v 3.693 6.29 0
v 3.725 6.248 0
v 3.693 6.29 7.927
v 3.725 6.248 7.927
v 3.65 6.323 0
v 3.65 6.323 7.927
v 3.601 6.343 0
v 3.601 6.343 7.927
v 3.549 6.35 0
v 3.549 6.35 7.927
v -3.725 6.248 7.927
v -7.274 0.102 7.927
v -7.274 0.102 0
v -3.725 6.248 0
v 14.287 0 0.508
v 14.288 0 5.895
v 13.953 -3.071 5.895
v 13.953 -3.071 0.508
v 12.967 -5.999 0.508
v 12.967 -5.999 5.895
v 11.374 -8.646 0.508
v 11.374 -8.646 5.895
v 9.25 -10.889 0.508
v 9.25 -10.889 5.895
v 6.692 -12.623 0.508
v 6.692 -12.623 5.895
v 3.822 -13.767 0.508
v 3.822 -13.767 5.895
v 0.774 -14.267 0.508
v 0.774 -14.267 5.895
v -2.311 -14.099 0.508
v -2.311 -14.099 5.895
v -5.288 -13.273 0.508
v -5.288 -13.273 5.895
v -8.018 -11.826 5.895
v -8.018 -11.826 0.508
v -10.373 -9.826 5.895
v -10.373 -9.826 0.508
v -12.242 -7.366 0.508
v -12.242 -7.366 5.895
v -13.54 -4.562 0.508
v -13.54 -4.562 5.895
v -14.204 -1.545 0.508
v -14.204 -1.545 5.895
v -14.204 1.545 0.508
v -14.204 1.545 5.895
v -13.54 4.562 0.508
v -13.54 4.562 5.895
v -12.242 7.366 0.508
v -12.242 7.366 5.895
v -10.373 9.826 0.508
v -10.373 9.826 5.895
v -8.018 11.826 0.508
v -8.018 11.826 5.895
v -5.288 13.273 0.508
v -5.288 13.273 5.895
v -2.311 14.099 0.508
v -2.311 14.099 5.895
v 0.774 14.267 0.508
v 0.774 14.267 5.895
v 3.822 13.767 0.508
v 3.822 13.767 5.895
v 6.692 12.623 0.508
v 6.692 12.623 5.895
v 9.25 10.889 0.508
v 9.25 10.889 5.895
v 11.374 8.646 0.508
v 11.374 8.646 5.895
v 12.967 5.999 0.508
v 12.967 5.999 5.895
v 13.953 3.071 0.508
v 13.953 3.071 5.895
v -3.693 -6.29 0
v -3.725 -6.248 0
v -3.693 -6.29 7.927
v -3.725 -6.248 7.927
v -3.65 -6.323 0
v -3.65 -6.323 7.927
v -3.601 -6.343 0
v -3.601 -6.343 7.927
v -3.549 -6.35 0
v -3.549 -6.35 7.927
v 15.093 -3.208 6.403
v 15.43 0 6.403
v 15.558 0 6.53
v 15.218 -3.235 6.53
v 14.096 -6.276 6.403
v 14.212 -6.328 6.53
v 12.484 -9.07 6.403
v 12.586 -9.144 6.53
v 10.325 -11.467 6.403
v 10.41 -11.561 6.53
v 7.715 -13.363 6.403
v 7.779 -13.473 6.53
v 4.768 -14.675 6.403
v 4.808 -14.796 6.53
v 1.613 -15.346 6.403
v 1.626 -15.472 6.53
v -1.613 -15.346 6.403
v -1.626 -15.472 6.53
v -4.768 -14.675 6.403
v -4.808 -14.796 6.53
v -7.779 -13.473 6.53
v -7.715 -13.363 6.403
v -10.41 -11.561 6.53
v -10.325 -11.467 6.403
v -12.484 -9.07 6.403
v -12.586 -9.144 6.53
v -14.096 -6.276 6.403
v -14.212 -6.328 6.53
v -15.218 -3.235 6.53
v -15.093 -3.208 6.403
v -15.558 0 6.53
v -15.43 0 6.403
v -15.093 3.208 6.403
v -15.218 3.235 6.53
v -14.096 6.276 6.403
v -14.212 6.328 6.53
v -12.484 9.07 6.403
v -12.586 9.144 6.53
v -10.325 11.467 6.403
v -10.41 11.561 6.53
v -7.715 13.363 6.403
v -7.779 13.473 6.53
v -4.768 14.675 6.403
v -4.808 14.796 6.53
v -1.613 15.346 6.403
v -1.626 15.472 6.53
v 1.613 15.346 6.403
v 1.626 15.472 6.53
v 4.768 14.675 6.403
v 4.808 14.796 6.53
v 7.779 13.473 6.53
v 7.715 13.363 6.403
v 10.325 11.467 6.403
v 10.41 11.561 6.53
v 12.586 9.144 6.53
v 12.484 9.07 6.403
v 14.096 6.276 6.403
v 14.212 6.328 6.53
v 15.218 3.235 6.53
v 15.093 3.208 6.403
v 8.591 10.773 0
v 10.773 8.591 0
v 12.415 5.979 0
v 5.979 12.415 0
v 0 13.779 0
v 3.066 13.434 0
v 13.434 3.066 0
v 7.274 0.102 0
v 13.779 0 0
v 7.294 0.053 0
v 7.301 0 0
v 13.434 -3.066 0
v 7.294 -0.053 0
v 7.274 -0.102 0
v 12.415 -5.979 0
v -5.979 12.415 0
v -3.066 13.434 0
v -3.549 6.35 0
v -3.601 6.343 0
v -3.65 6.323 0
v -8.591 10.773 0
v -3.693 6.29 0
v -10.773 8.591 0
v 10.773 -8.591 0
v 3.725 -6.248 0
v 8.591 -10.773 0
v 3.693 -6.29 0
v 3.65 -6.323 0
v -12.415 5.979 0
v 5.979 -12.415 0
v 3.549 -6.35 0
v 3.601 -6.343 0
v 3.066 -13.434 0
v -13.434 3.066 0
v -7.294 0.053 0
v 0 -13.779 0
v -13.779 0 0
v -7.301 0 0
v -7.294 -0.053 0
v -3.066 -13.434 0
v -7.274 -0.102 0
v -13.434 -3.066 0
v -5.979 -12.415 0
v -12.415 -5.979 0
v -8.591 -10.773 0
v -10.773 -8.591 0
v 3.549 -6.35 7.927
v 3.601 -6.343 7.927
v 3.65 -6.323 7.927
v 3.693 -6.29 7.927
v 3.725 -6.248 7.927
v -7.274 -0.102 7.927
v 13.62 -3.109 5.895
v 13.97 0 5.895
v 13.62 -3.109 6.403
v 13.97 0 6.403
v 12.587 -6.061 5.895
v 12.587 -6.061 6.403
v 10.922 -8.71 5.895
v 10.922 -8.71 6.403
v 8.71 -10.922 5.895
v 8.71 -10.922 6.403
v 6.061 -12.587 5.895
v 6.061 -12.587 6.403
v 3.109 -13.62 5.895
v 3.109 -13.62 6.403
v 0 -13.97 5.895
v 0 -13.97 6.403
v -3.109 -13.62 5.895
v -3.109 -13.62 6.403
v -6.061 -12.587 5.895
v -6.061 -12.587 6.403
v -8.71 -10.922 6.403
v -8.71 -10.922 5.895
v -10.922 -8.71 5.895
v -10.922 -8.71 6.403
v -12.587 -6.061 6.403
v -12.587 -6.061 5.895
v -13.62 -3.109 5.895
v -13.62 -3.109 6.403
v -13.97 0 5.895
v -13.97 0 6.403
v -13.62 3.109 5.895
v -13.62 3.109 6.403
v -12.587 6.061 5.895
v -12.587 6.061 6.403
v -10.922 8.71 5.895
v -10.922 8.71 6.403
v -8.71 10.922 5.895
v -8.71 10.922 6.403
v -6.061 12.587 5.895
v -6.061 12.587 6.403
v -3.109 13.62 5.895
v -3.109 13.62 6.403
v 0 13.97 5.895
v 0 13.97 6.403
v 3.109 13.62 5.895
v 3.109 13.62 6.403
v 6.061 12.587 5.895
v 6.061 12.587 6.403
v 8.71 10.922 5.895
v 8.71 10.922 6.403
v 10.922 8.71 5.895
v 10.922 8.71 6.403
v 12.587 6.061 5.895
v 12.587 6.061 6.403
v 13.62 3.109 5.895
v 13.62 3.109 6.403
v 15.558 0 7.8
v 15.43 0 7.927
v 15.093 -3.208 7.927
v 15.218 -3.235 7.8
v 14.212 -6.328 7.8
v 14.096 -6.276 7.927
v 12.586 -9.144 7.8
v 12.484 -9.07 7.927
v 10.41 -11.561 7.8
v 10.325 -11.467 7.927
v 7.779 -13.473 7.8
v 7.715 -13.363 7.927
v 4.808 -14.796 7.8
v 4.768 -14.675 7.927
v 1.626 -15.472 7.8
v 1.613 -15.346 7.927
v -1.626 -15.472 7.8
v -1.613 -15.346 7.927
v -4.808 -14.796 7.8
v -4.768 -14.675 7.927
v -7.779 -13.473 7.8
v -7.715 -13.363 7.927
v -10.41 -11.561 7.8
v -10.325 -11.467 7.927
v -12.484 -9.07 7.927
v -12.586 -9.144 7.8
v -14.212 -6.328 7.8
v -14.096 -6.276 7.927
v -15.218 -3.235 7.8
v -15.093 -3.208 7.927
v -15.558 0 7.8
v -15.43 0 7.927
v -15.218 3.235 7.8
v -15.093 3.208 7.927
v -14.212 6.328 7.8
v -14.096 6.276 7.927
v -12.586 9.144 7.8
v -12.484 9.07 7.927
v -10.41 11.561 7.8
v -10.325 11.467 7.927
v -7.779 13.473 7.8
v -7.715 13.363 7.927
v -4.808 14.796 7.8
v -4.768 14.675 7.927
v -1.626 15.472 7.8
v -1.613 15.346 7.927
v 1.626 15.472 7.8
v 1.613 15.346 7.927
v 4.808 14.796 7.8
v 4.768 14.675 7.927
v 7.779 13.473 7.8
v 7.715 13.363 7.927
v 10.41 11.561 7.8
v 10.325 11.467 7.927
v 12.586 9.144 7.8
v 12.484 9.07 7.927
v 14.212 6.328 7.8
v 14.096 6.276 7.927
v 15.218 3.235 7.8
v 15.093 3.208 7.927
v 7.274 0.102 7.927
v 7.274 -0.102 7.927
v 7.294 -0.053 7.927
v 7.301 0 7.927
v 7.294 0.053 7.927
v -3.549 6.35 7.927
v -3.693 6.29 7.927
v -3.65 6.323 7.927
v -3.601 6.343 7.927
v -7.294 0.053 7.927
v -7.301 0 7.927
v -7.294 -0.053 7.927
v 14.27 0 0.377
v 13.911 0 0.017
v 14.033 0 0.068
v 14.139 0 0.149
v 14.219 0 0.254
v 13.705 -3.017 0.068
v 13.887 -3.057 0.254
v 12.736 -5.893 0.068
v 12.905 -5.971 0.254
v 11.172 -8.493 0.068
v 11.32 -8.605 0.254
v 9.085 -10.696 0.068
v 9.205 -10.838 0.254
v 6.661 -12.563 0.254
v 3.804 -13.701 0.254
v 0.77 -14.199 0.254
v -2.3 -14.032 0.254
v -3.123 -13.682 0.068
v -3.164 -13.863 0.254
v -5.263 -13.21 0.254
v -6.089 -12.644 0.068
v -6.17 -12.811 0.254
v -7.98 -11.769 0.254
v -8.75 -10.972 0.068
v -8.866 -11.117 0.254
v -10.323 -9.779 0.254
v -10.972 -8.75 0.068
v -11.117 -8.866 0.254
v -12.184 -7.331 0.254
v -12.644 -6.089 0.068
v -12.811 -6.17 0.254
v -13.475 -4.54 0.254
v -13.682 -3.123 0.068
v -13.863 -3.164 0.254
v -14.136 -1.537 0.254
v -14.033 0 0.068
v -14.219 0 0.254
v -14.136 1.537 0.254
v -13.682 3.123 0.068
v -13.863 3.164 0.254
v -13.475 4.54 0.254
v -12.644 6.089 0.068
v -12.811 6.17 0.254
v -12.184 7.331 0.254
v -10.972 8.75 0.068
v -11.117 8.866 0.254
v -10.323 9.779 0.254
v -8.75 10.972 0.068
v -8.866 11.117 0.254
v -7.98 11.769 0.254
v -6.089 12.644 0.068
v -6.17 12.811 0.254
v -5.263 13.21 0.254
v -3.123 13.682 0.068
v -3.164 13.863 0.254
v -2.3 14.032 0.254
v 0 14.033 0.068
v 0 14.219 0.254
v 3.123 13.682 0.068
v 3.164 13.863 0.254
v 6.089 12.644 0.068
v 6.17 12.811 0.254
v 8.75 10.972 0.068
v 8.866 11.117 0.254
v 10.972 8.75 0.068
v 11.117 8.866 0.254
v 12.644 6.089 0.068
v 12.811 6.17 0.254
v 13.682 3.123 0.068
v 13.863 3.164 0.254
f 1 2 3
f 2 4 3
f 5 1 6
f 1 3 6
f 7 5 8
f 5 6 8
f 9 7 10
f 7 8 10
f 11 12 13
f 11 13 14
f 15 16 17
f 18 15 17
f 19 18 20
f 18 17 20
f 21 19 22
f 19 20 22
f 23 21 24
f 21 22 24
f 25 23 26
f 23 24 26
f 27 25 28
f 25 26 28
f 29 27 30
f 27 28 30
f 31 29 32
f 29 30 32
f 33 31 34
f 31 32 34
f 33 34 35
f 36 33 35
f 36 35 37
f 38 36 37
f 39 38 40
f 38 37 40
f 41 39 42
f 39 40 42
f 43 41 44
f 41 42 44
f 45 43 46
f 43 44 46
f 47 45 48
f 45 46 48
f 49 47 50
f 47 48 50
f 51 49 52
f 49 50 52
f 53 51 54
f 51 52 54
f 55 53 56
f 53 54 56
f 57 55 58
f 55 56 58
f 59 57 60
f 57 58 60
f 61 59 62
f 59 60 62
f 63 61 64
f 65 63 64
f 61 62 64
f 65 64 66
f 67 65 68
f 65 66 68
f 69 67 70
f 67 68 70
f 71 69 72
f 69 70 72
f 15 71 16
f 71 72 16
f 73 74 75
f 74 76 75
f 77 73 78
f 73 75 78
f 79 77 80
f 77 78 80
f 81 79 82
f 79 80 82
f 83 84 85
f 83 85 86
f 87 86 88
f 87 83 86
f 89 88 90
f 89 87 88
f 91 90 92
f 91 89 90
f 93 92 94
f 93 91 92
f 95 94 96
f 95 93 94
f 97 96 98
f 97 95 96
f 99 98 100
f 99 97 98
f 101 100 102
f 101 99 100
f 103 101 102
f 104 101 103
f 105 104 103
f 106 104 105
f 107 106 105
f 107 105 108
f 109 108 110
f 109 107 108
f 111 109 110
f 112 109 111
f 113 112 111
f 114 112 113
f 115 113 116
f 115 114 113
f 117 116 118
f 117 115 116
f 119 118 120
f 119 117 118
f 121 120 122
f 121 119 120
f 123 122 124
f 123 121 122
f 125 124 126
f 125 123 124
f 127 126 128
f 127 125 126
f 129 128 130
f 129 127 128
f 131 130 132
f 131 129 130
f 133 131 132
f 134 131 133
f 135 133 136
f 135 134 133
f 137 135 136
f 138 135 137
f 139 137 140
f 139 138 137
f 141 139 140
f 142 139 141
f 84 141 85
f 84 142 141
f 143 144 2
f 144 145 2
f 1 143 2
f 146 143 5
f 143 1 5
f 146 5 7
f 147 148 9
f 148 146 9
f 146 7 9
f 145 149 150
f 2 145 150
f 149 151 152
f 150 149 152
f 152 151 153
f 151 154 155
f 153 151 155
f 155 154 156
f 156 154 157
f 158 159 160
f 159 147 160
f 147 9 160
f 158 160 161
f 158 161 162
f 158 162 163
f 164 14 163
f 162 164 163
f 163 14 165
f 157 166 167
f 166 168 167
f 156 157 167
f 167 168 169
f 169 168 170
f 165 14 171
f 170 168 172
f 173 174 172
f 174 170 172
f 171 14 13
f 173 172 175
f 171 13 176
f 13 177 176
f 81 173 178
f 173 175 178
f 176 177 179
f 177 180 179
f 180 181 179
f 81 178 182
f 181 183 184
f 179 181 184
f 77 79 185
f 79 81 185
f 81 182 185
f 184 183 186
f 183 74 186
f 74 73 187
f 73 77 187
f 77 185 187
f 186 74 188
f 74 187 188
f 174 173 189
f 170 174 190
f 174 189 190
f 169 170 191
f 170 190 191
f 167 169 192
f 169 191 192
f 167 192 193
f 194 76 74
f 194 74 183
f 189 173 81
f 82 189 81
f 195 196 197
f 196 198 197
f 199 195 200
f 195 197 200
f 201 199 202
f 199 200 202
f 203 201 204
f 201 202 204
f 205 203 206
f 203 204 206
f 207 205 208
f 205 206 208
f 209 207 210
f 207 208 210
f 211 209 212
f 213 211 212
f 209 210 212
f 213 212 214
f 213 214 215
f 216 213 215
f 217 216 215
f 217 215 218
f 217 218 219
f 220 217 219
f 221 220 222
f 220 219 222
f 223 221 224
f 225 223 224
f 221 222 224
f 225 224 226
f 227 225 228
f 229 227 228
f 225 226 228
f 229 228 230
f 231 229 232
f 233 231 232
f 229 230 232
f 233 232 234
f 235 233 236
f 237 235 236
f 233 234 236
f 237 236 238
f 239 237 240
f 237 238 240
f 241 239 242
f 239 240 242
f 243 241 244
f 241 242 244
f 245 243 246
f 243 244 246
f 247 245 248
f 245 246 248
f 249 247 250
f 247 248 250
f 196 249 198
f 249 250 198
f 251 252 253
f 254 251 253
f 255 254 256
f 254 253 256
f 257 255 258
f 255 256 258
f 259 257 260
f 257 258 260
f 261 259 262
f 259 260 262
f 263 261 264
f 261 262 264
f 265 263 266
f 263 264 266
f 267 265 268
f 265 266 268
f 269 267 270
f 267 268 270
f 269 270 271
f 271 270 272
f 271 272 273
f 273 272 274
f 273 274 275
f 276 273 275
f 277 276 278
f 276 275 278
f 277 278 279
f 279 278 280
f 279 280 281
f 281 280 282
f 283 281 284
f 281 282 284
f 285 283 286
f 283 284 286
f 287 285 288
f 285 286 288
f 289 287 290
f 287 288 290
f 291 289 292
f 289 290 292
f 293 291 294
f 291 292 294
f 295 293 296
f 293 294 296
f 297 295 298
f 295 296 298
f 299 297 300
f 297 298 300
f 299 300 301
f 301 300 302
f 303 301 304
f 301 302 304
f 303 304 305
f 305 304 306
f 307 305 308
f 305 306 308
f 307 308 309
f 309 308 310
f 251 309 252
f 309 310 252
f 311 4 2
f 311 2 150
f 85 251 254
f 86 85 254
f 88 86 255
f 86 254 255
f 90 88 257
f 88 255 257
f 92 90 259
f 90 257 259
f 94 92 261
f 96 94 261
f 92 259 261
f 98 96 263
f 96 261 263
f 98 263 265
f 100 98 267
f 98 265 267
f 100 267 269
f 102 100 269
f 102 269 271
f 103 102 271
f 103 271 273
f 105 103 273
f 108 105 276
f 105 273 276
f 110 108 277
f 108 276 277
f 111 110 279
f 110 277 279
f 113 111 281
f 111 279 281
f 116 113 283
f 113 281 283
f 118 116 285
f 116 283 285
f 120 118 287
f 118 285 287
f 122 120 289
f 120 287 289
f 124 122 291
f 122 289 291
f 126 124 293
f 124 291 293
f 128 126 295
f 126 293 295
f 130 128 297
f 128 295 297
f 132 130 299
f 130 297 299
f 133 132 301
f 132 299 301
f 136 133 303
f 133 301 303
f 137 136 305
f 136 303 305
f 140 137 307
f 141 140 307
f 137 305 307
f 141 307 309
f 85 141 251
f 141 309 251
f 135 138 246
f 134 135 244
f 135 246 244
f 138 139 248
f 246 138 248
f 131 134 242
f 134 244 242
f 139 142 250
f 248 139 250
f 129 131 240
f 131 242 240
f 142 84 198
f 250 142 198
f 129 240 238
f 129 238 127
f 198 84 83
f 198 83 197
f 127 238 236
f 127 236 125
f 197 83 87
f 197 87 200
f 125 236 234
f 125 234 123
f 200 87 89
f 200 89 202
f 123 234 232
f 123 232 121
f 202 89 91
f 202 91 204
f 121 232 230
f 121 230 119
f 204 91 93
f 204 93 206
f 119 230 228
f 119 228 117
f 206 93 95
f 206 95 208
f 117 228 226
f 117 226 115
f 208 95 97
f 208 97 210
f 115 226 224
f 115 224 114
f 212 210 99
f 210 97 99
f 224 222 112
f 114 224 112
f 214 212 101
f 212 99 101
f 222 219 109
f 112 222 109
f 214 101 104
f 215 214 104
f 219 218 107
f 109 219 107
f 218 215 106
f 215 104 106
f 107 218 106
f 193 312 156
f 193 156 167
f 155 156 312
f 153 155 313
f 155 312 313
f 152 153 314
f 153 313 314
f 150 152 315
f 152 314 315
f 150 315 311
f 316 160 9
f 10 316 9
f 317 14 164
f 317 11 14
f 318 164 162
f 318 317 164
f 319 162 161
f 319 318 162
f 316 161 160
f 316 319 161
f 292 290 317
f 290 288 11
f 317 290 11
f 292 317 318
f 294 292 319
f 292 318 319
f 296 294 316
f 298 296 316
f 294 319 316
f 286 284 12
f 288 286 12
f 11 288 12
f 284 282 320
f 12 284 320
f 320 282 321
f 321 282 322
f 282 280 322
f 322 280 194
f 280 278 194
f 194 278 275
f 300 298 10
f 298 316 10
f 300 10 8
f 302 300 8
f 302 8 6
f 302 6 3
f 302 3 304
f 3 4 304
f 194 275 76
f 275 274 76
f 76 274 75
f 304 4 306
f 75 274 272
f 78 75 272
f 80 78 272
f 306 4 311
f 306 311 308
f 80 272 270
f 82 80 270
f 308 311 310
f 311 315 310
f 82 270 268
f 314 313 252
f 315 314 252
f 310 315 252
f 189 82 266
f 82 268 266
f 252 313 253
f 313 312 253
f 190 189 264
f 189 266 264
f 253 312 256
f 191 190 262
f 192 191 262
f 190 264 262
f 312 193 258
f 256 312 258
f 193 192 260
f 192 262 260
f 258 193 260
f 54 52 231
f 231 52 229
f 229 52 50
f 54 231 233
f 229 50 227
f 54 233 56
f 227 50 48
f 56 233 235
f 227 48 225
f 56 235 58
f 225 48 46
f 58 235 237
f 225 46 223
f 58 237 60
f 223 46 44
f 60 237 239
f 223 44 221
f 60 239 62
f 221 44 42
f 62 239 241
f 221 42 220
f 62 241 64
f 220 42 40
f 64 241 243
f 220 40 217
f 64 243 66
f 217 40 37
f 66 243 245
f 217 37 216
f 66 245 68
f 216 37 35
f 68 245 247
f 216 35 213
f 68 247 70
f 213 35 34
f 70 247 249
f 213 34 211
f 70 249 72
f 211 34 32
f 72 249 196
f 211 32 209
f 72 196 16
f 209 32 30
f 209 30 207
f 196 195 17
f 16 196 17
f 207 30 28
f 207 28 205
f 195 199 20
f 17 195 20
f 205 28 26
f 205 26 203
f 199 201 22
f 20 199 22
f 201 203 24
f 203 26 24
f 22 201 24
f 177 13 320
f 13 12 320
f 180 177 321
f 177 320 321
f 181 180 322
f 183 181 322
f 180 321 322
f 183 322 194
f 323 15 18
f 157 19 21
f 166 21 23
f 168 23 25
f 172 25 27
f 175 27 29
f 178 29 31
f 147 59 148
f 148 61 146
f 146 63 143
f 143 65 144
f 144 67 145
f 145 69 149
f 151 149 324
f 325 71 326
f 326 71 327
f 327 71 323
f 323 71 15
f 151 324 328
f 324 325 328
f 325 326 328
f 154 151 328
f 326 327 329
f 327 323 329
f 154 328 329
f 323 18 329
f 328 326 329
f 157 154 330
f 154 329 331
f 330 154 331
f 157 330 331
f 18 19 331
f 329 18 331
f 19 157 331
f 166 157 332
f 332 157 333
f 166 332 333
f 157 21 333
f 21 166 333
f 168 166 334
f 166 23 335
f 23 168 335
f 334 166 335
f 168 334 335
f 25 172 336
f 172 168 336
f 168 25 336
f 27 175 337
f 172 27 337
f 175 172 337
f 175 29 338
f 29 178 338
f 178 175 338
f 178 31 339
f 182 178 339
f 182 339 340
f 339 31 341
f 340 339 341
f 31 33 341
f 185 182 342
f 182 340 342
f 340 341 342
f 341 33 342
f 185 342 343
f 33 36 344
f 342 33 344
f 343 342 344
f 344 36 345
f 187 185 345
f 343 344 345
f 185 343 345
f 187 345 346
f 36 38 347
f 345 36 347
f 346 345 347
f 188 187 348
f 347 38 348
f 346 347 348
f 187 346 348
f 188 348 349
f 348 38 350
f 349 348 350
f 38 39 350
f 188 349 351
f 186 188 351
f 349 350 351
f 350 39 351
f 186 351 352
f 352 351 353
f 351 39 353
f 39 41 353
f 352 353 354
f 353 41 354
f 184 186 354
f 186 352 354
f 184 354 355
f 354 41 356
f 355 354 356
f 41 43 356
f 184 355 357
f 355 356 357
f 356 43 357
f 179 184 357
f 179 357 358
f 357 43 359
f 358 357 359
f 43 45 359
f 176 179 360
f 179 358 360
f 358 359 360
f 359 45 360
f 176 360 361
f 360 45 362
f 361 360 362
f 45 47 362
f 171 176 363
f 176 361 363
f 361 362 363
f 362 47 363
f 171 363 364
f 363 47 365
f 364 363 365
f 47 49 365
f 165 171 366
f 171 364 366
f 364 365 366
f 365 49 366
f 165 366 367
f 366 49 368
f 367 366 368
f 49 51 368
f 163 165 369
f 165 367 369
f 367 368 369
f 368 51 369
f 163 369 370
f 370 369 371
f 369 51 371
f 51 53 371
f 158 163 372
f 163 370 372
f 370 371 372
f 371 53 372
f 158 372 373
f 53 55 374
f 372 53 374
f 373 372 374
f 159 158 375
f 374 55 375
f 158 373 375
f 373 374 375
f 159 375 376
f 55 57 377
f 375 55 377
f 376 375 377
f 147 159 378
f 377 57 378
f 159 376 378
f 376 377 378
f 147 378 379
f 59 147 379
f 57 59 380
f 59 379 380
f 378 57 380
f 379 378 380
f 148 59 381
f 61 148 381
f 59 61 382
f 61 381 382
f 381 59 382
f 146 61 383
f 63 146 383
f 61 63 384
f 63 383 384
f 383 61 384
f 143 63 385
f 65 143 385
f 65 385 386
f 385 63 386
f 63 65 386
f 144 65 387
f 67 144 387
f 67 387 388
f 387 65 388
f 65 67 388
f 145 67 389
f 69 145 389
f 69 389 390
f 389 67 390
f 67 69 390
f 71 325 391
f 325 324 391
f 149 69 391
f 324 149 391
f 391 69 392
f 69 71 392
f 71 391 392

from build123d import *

# Parameters (mm, degrees)
CUT_EXTRUDE1_DEPTH = 8.92734
CHAMFER1_SIZE      = 0.127
CHAMFER2_SIZE      = 0.127
FILLET1_R          = 0.508
FILLET2_R          = 0.2032


with BuildPart() as part:
    # Sketch1 → Revolve1 (revolve)
    with BuildSketch(Plane.XZ):
        Polygon((15.5575, 7.92734), (0, 7.92734), (0, 0), (14.2875, 0), (14.2875, 5.89534), (13.97, 5.89534), (13.97, 6.40334), (15.5575, 6.40334), align=None)
    revolve(axis=Axis((0, 0, 7.92734), (0, 0, -1)))

    # Sketch2 → Cut-Extrude1 (cut, through all)
    with BuildSketch(Plane(origin=(0, 0, 0), x_dir=(-1, 0, 0), z_dir=(0, 0, -1))):
        Polygon((3.666174209, 6.35), (-3.666174209, 6.35), (-7.332348419, 0), (-3.666174209, -6.35), (3.666174209, -6.35), (7.332348419, 0), align=None)
    extrude(amount=-CUT_EXTRUDE1_DEPTH, mode=Mode.SUBTRACT)

    # Chamfer1
    chamfer1_edges = [part.edges().sort_by_distance(p)[0] for p in [
        (-15.5575, 0, 6.40334),
    ]]
    chamfer(chamfer1_edges, length=CHAMFER1_SIZE)

    # Chamfer2
    chamfer2_edges = [part.edges().sort_by_distance(p)[0] for p in [
        (-15.5575, 0, 7.92734),
    ]]
    chamfer(chamfer2_edges, length=CHAMFER2_SIZE)

    # Fillet1
    fillet1_edges = [part.edges().sort_by_distance(p)[0] for p in [
        (-14.2875, 0, 0),
    ]]
    fillet(fillet1_edges, radius=FILLET1_R)

    # Fillet2
    fillet2_edges = [part.edges().sort_by_distance(p)[0] for p in [
        (-3.666174209, 6.35, 3.96367),
        (-7.332348419, 0, 3.96367),
        (-3.666174209, -6.35, 3.96367),
        (3.666174209, -6.35, 3.96367),
        (7.332348419, 0, 3.96367),
        (3.666174209, 6.35, 3.96367),
    ]]
    fillet(fillet2_edges, radius=FILLET2_R)


solid = part.part
